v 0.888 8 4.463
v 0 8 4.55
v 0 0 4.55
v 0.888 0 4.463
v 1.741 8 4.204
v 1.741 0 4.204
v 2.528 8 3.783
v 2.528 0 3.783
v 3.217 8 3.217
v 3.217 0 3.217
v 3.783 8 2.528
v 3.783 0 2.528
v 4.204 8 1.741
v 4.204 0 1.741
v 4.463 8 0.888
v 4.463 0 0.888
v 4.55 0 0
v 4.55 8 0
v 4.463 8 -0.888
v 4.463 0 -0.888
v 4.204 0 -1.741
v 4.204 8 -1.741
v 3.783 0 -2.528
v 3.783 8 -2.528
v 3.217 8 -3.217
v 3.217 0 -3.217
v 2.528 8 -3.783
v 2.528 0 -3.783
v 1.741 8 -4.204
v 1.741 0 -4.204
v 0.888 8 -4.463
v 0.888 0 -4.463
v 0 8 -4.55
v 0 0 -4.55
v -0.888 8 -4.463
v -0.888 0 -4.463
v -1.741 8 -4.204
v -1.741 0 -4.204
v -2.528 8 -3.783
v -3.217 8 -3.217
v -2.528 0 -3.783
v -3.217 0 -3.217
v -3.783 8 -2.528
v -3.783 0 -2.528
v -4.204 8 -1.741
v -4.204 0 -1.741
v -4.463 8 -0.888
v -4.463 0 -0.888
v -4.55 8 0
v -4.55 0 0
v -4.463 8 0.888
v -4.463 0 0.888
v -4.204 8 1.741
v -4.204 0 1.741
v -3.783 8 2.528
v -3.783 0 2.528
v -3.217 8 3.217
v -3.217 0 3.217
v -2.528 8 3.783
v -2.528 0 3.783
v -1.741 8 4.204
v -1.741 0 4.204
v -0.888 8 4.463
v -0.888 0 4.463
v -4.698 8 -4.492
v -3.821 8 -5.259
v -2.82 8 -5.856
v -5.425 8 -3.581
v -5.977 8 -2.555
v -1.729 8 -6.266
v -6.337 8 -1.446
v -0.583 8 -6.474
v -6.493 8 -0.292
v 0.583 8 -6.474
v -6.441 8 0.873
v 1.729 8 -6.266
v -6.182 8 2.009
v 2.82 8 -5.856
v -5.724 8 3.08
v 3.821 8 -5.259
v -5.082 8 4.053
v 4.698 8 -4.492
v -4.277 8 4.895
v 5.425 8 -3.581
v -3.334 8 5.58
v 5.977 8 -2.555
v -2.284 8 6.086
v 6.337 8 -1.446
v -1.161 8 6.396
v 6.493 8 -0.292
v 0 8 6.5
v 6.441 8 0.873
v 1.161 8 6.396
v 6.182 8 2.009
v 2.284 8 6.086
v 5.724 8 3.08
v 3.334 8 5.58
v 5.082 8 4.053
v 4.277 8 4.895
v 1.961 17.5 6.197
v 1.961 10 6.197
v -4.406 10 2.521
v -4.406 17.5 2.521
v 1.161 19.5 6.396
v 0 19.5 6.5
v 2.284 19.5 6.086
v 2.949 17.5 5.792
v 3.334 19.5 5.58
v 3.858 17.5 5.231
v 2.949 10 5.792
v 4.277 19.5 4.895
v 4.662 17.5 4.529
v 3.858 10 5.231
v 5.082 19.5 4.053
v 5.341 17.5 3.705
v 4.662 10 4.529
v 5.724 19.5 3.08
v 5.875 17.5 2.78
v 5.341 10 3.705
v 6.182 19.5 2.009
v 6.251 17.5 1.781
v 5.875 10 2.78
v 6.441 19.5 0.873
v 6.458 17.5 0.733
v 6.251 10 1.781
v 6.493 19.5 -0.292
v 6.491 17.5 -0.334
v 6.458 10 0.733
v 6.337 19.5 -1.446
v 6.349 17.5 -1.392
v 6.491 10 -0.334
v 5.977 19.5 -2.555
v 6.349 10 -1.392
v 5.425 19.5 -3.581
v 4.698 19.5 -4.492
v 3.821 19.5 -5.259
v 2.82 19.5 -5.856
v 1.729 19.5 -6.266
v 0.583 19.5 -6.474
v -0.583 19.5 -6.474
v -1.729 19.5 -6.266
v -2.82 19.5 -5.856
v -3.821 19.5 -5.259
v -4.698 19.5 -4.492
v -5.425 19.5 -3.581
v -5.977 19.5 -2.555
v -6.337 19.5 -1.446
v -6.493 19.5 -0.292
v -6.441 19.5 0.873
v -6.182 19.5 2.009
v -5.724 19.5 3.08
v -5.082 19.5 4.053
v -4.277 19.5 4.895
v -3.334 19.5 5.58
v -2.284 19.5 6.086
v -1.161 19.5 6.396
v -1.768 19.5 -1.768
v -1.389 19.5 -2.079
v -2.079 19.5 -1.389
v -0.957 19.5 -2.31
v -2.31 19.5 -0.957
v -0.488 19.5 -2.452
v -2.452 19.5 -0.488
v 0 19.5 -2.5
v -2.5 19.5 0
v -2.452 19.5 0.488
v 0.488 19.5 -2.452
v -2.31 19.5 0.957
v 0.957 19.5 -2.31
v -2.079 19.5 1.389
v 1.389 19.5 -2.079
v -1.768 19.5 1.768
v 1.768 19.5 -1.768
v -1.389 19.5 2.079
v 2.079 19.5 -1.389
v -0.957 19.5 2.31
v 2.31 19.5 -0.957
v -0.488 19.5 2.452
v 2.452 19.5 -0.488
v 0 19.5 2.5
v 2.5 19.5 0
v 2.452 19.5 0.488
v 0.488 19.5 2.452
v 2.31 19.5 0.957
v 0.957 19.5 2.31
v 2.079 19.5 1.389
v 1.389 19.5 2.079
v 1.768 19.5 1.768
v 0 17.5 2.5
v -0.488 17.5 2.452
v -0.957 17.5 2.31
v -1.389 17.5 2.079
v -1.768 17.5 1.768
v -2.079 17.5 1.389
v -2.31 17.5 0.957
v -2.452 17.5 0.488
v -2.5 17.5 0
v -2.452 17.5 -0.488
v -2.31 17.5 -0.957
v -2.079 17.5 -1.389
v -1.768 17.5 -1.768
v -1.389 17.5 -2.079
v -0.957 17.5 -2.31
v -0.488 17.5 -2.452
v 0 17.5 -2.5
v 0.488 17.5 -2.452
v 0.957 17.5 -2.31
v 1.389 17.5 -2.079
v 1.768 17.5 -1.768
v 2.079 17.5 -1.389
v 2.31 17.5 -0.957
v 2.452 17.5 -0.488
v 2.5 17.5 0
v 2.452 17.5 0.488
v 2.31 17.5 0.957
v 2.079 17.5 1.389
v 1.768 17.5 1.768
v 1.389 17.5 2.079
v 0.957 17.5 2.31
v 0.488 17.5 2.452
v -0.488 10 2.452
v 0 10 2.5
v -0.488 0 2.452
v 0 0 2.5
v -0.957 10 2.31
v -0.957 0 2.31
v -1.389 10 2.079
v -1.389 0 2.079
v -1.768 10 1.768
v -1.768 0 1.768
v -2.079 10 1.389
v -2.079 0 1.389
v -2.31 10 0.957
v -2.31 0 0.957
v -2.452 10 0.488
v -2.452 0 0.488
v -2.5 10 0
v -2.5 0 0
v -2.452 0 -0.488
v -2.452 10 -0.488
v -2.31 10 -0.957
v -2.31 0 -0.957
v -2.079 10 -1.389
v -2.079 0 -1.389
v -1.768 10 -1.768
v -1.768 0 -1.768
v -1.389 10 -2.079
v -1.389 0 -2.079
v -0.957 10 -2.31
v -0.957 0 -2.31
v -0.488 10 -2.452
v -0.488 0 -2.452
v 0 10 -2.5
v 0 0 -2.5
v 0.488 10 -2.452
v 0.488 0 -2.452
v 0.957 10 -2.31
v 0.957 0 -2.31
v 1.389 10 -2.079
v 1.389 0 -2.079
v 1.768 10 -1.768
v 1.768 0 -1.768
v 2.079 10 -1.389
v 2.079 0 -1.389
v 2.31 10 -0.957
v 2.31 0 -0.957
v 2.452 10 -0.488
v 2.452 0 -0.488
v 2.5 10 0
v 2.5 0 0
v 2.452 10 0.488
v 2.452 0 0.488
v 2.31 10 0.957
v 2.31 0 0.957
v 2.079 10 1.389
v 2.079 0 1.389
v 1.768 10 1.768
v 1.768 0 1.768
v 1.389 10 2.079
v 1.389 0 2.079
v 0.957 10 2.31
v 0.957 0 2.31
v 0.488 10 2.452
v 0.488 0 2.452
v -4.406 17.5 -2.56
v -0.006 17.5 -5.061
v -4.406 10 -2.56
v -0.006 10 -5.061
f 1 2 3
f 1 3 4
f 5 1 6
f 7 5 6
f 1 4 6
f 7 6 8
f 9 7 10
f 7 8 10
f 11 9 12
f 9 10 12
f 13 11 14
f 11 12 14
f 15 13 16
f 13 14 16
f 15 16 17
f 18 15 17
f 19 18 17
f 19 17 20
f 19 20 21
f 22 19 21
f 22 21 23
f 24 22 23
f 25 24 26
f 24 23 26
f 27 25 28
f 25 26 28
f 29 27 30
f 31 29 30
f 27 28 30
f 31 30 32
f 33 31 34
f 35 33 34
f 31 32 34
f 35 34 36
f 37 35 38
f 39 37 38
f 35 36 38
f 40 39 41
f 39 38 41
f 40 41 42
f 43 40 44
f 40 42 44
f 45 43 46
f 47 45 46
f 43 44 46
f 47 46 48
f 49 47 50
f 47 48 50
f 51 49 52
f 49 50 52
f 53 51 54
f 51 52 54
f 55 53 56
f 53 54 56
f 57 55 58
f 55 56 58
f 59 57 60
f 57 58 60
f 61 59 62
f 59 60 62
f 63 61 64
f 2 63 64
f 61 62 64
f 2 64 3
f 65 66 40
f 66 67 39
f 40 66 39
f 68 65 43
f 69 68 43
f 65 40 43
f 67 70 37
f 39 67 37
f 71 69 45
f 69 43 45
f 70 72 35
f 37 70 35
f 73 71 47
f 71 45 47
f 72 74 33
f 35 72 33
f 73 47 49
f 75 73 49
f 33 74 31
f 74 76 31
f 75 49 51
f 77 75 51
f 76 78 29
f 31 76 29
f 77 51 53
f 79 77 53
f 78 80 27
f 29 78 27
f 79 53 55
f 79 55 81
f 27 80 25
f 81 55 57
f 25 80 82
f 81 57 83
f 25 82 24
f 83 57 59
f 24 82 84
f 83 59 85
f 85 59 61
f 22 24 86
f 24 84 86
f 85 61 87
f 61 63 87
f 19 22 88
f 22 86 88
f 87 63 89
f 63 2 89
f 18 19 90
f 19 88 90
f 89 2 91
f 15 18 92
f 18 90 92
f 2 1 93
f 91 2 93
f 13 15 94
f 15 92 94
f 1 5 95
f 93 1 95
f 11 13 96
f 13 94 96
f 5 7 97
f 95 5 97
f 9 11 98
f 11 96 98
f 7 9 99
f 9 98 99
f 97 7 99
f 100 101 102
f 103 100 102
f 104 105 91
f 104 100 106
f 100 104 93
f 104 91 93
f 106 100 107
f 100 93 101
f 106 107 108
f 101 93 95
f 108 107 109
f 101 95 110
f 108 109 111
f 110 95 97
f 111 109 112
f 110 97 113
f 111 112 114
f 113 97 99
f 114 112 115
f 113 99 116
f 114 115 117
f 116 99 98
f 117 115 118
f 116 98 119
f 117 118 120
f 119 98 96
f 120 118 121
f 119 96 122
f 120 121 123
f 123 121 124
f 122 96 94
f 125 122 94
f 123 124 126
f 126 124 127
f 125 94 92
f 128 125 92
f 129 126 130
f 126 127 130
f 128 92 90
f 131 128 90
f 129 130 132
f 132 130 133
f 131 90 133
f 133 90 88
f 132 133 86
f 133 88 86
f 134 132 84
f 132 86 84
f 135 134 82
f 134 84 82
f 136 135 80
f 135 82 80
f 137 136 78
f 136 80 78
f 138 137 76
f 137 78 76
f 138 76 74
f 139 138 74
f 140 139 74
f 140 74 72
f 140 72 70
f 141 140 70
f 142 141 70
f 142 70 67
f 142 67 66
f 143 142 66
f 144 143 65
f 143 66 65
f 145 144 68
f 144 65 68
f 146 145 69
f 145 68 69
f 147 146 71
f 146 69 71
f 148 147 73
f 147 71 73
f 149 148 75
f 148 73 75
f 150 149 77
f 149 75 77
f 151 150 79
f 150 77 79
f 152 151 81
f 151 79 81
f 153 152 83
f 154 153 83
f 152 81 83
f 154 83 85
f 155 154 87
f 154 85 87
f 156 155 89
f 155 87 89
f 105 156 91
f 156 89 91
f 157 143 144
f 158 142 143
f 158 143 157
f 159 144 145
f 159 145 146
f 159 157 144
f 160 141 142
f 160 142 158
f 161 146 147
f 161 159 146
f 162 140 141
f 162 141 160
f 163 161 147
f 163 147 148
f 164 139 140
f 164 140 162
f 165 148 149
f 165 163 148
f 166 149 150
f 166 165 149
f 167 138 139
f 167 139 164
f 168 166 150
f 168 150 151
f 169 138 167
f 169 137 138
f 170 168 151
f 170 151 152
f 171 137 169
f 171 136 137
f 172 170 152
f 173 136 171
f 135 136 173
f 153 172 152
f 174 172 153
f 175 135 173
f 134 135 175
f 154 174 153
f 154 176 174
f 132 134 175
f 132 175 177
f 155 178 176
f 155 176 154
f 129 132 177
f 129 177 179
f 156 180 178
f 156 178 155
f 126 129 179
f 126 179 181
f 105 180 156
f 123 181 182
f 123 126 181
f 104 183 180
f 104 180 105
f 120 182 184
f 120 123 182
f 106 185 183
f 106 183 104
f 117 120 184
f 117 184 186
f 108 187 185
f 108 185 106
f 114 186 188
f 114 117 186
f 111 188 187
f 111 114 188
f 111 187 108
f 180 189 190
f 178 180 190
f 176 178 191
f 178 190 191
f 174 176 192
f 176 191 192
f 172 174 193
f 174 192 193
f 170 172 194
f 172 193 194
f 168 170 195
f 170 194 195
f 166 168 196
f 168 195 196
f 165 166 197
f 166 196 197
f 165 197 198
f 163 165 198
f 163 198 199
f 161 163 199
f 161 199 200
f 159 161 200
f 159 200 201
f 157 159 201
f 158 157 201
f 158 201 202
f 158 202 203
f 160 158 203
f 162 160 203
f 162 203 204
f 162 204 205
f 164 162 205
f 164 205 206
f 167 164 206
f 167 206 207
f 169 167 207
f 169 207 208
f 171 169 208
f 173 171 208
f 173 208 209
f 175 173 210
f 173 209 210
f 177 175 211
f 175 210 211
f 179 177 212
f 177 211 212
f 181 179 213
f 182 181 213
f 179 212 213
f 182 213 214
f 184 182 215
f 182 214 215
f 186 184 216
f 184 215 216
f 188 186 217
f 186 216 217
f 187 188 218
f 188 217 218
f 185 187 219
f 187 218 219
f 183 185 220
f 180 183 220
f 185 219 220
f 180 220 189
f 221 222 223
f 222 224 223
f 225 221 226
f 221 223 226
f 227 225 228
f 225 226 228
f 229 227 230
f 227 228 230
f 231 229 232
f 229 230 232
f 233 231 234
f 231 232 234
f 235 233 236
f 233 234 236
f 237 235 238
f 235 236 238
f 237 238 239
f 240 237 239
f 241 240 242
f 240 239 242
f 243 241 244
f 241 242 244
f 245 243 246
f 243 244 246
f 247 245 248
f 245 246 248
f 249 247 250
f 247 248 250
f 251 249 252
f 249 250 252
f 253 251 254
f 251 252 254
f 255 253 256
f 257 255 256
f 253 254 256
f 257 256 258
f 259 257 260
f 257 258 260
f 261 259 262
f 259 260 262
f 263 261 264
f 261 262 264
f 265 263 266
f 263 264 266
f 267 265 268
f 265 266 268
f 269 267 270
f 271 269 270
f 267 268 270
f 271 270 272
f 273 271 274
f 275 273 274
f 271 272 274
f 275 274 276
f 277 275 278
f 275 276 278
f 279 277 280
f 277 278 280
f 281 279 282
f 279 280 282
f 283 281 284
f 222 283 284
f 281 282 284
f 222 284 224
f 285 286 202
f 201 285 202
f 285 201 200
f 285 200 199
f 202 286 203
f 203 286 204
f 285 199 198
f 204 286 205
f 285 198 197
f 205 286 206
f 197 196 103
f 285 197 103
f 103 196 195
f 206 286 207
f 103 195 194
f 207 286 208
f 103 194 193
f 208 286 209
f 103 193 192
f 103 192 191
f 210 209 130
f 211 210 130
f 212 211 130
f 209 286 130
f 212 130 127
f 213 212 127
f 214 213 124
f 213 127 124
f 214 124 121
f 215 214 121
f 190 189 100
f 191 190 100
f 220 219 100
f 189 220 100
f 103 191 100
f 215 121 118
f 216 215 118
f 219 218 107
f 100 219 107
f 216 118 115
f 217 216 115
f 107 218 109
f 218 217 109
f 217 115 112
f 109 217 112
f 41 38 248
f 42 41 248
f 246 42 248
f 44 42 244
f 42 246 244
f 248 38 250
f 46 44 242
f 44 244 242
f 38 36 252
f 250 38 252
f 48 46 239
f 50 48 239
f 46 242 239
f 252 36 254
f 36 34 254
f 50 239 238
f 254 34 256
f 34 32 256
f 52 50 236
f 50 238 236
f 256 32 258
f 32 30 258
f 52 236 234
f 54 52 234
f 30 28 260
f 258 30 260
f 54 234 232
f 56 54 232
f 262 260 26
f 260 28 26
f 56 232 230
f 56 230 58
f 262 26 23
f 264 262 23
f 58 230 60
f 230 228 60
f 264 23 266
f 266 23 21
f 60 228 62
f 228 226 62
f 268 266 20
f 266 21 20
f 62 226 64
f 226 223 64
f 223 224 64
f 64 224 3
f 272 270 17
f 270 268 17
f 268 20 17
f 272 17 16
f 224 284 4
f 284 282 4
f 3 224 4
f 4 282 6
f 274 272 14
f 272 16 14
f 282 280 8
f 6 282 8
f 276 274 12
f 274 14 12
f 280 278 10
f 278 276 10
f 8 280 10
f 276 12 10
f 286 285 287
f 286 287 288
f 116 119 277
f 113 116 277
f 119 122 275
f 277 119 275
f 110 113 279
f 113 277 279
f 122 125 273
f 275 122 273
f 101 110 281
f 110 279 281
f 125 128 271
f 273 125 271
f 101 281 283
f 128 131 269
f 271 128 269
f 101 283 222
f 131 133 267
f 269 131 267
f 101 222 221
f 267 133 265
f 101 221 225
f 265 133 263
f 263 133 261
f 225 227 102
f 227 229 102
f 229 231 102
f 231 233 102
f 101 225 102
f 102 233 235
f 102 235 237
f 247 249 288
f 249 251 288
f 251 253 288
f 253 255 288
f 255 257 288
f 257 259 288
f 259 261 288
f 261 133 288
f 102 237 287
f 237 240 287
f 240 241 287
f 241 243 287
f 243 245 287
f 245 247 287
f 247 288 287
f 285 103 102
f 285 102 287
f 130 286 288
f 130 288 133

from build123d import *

# Parameters (mm, degrees)
SKETCH1_R           = 4.55
BOSS_EXTRUDE1_DEPTH = 8
SKETCH2_R           = 2.5
CUT_EXTRUDE1_DEPTH  = 8
SKETCH3_R           = 6.5
BOSS_EXTRUDE4_DEPTH = 9.5
CUT_EXTRUDE2_DEPTH  = 7.5
SKETCH6_R           = 6.5
BOSS_EXTRUDE5_DEPTH = 2
SKETCH7_R           = 2.5
CUT_EXTRUDE3_DEPTH  = 22.558061137


with BuildPart() as part:
    # Sketch1 → Boss-Extrude1 (new body)
    with BuildSketch(Plane(origin=(0, 0, 0), x_dir=(1, 0, 0), z_dir=(0, 1, 0))):
        with Locations(Location((0, 0, 0), (0, 0, 270))):
            Circle(SKETCH1_R)
    extrude(amount=BOSS_EXTRUDE1_DEPTH)

    # Sketch2 → Cut-Extrude1 (cut)
    with BuildSketch(Plane(origin=(0, 8, 0), x_dir=(1, 0, 0), z_dir=(0, 1, 0))):
        with Locations(Location((0, 0, 0), (0, 0, 270))):
            Circle(SKETCH2_R)
    extrude(amount=-CUT_EXTRUDE1_DEPTH, mode=Mode.SUBTRACT)

    # Sketch3 → Boss-Extrude4 (add)
    with BuildSketch(Plane(origin=(0, 8, 0), x_dir=(1, 0, 0), z_dir=(0, 1, 0))):
        with Locations(Location((0, 0, 0), (0, 0, 270))):
            Circle(SKETCH3_R)
    extrude(amount=BOSS_EXTRUDE4_DEPTH)

    # Sketch5 → Cut-Extrude2 (cut)
    with BuildSketch(Plane(origin=(0, 17.5, 0), x_dir=(1, 0, 0), z_dir=(0, 1, 0))):
        Polygon((-4.406153459, -2.521016119), (-4.406153459, 2.55966625), (-0.006153459, 5.061357304), (7.819258761, 0.543353452), (3.435994759, -7.048682503), align=None)
    extrude(amount=-CUT_EXTRUDE2_DEPTH, mode=Mode.SUBTRACT)

    # Sketch6 → Boss-Extrude5 (add)
    with BuildSketch(Plane(origin=(0, 17.5, 0), x_dir=(1, 0, 0), z_dir=(0, 1, 0))):
        with Locations(Location((0, 0, 0), (0, 0, 270))):
            Circle(SKETCH6_R)
    extrude(amount=BOSS_EXTRUDE5_DEPTH)

    # Sketch7 → Cut-Extrude3 (cut, through all)
    with BuildSketch(Plane.XZ):
        with Locations(Location((0, 0, 0), (0, 0, 90))):
            Circle(SKETCH7_R)
    extrude(amount=-CUT_EXTRUDE3_DEPTH, mode=Mode.SUBTRACT)


solid = part.part
